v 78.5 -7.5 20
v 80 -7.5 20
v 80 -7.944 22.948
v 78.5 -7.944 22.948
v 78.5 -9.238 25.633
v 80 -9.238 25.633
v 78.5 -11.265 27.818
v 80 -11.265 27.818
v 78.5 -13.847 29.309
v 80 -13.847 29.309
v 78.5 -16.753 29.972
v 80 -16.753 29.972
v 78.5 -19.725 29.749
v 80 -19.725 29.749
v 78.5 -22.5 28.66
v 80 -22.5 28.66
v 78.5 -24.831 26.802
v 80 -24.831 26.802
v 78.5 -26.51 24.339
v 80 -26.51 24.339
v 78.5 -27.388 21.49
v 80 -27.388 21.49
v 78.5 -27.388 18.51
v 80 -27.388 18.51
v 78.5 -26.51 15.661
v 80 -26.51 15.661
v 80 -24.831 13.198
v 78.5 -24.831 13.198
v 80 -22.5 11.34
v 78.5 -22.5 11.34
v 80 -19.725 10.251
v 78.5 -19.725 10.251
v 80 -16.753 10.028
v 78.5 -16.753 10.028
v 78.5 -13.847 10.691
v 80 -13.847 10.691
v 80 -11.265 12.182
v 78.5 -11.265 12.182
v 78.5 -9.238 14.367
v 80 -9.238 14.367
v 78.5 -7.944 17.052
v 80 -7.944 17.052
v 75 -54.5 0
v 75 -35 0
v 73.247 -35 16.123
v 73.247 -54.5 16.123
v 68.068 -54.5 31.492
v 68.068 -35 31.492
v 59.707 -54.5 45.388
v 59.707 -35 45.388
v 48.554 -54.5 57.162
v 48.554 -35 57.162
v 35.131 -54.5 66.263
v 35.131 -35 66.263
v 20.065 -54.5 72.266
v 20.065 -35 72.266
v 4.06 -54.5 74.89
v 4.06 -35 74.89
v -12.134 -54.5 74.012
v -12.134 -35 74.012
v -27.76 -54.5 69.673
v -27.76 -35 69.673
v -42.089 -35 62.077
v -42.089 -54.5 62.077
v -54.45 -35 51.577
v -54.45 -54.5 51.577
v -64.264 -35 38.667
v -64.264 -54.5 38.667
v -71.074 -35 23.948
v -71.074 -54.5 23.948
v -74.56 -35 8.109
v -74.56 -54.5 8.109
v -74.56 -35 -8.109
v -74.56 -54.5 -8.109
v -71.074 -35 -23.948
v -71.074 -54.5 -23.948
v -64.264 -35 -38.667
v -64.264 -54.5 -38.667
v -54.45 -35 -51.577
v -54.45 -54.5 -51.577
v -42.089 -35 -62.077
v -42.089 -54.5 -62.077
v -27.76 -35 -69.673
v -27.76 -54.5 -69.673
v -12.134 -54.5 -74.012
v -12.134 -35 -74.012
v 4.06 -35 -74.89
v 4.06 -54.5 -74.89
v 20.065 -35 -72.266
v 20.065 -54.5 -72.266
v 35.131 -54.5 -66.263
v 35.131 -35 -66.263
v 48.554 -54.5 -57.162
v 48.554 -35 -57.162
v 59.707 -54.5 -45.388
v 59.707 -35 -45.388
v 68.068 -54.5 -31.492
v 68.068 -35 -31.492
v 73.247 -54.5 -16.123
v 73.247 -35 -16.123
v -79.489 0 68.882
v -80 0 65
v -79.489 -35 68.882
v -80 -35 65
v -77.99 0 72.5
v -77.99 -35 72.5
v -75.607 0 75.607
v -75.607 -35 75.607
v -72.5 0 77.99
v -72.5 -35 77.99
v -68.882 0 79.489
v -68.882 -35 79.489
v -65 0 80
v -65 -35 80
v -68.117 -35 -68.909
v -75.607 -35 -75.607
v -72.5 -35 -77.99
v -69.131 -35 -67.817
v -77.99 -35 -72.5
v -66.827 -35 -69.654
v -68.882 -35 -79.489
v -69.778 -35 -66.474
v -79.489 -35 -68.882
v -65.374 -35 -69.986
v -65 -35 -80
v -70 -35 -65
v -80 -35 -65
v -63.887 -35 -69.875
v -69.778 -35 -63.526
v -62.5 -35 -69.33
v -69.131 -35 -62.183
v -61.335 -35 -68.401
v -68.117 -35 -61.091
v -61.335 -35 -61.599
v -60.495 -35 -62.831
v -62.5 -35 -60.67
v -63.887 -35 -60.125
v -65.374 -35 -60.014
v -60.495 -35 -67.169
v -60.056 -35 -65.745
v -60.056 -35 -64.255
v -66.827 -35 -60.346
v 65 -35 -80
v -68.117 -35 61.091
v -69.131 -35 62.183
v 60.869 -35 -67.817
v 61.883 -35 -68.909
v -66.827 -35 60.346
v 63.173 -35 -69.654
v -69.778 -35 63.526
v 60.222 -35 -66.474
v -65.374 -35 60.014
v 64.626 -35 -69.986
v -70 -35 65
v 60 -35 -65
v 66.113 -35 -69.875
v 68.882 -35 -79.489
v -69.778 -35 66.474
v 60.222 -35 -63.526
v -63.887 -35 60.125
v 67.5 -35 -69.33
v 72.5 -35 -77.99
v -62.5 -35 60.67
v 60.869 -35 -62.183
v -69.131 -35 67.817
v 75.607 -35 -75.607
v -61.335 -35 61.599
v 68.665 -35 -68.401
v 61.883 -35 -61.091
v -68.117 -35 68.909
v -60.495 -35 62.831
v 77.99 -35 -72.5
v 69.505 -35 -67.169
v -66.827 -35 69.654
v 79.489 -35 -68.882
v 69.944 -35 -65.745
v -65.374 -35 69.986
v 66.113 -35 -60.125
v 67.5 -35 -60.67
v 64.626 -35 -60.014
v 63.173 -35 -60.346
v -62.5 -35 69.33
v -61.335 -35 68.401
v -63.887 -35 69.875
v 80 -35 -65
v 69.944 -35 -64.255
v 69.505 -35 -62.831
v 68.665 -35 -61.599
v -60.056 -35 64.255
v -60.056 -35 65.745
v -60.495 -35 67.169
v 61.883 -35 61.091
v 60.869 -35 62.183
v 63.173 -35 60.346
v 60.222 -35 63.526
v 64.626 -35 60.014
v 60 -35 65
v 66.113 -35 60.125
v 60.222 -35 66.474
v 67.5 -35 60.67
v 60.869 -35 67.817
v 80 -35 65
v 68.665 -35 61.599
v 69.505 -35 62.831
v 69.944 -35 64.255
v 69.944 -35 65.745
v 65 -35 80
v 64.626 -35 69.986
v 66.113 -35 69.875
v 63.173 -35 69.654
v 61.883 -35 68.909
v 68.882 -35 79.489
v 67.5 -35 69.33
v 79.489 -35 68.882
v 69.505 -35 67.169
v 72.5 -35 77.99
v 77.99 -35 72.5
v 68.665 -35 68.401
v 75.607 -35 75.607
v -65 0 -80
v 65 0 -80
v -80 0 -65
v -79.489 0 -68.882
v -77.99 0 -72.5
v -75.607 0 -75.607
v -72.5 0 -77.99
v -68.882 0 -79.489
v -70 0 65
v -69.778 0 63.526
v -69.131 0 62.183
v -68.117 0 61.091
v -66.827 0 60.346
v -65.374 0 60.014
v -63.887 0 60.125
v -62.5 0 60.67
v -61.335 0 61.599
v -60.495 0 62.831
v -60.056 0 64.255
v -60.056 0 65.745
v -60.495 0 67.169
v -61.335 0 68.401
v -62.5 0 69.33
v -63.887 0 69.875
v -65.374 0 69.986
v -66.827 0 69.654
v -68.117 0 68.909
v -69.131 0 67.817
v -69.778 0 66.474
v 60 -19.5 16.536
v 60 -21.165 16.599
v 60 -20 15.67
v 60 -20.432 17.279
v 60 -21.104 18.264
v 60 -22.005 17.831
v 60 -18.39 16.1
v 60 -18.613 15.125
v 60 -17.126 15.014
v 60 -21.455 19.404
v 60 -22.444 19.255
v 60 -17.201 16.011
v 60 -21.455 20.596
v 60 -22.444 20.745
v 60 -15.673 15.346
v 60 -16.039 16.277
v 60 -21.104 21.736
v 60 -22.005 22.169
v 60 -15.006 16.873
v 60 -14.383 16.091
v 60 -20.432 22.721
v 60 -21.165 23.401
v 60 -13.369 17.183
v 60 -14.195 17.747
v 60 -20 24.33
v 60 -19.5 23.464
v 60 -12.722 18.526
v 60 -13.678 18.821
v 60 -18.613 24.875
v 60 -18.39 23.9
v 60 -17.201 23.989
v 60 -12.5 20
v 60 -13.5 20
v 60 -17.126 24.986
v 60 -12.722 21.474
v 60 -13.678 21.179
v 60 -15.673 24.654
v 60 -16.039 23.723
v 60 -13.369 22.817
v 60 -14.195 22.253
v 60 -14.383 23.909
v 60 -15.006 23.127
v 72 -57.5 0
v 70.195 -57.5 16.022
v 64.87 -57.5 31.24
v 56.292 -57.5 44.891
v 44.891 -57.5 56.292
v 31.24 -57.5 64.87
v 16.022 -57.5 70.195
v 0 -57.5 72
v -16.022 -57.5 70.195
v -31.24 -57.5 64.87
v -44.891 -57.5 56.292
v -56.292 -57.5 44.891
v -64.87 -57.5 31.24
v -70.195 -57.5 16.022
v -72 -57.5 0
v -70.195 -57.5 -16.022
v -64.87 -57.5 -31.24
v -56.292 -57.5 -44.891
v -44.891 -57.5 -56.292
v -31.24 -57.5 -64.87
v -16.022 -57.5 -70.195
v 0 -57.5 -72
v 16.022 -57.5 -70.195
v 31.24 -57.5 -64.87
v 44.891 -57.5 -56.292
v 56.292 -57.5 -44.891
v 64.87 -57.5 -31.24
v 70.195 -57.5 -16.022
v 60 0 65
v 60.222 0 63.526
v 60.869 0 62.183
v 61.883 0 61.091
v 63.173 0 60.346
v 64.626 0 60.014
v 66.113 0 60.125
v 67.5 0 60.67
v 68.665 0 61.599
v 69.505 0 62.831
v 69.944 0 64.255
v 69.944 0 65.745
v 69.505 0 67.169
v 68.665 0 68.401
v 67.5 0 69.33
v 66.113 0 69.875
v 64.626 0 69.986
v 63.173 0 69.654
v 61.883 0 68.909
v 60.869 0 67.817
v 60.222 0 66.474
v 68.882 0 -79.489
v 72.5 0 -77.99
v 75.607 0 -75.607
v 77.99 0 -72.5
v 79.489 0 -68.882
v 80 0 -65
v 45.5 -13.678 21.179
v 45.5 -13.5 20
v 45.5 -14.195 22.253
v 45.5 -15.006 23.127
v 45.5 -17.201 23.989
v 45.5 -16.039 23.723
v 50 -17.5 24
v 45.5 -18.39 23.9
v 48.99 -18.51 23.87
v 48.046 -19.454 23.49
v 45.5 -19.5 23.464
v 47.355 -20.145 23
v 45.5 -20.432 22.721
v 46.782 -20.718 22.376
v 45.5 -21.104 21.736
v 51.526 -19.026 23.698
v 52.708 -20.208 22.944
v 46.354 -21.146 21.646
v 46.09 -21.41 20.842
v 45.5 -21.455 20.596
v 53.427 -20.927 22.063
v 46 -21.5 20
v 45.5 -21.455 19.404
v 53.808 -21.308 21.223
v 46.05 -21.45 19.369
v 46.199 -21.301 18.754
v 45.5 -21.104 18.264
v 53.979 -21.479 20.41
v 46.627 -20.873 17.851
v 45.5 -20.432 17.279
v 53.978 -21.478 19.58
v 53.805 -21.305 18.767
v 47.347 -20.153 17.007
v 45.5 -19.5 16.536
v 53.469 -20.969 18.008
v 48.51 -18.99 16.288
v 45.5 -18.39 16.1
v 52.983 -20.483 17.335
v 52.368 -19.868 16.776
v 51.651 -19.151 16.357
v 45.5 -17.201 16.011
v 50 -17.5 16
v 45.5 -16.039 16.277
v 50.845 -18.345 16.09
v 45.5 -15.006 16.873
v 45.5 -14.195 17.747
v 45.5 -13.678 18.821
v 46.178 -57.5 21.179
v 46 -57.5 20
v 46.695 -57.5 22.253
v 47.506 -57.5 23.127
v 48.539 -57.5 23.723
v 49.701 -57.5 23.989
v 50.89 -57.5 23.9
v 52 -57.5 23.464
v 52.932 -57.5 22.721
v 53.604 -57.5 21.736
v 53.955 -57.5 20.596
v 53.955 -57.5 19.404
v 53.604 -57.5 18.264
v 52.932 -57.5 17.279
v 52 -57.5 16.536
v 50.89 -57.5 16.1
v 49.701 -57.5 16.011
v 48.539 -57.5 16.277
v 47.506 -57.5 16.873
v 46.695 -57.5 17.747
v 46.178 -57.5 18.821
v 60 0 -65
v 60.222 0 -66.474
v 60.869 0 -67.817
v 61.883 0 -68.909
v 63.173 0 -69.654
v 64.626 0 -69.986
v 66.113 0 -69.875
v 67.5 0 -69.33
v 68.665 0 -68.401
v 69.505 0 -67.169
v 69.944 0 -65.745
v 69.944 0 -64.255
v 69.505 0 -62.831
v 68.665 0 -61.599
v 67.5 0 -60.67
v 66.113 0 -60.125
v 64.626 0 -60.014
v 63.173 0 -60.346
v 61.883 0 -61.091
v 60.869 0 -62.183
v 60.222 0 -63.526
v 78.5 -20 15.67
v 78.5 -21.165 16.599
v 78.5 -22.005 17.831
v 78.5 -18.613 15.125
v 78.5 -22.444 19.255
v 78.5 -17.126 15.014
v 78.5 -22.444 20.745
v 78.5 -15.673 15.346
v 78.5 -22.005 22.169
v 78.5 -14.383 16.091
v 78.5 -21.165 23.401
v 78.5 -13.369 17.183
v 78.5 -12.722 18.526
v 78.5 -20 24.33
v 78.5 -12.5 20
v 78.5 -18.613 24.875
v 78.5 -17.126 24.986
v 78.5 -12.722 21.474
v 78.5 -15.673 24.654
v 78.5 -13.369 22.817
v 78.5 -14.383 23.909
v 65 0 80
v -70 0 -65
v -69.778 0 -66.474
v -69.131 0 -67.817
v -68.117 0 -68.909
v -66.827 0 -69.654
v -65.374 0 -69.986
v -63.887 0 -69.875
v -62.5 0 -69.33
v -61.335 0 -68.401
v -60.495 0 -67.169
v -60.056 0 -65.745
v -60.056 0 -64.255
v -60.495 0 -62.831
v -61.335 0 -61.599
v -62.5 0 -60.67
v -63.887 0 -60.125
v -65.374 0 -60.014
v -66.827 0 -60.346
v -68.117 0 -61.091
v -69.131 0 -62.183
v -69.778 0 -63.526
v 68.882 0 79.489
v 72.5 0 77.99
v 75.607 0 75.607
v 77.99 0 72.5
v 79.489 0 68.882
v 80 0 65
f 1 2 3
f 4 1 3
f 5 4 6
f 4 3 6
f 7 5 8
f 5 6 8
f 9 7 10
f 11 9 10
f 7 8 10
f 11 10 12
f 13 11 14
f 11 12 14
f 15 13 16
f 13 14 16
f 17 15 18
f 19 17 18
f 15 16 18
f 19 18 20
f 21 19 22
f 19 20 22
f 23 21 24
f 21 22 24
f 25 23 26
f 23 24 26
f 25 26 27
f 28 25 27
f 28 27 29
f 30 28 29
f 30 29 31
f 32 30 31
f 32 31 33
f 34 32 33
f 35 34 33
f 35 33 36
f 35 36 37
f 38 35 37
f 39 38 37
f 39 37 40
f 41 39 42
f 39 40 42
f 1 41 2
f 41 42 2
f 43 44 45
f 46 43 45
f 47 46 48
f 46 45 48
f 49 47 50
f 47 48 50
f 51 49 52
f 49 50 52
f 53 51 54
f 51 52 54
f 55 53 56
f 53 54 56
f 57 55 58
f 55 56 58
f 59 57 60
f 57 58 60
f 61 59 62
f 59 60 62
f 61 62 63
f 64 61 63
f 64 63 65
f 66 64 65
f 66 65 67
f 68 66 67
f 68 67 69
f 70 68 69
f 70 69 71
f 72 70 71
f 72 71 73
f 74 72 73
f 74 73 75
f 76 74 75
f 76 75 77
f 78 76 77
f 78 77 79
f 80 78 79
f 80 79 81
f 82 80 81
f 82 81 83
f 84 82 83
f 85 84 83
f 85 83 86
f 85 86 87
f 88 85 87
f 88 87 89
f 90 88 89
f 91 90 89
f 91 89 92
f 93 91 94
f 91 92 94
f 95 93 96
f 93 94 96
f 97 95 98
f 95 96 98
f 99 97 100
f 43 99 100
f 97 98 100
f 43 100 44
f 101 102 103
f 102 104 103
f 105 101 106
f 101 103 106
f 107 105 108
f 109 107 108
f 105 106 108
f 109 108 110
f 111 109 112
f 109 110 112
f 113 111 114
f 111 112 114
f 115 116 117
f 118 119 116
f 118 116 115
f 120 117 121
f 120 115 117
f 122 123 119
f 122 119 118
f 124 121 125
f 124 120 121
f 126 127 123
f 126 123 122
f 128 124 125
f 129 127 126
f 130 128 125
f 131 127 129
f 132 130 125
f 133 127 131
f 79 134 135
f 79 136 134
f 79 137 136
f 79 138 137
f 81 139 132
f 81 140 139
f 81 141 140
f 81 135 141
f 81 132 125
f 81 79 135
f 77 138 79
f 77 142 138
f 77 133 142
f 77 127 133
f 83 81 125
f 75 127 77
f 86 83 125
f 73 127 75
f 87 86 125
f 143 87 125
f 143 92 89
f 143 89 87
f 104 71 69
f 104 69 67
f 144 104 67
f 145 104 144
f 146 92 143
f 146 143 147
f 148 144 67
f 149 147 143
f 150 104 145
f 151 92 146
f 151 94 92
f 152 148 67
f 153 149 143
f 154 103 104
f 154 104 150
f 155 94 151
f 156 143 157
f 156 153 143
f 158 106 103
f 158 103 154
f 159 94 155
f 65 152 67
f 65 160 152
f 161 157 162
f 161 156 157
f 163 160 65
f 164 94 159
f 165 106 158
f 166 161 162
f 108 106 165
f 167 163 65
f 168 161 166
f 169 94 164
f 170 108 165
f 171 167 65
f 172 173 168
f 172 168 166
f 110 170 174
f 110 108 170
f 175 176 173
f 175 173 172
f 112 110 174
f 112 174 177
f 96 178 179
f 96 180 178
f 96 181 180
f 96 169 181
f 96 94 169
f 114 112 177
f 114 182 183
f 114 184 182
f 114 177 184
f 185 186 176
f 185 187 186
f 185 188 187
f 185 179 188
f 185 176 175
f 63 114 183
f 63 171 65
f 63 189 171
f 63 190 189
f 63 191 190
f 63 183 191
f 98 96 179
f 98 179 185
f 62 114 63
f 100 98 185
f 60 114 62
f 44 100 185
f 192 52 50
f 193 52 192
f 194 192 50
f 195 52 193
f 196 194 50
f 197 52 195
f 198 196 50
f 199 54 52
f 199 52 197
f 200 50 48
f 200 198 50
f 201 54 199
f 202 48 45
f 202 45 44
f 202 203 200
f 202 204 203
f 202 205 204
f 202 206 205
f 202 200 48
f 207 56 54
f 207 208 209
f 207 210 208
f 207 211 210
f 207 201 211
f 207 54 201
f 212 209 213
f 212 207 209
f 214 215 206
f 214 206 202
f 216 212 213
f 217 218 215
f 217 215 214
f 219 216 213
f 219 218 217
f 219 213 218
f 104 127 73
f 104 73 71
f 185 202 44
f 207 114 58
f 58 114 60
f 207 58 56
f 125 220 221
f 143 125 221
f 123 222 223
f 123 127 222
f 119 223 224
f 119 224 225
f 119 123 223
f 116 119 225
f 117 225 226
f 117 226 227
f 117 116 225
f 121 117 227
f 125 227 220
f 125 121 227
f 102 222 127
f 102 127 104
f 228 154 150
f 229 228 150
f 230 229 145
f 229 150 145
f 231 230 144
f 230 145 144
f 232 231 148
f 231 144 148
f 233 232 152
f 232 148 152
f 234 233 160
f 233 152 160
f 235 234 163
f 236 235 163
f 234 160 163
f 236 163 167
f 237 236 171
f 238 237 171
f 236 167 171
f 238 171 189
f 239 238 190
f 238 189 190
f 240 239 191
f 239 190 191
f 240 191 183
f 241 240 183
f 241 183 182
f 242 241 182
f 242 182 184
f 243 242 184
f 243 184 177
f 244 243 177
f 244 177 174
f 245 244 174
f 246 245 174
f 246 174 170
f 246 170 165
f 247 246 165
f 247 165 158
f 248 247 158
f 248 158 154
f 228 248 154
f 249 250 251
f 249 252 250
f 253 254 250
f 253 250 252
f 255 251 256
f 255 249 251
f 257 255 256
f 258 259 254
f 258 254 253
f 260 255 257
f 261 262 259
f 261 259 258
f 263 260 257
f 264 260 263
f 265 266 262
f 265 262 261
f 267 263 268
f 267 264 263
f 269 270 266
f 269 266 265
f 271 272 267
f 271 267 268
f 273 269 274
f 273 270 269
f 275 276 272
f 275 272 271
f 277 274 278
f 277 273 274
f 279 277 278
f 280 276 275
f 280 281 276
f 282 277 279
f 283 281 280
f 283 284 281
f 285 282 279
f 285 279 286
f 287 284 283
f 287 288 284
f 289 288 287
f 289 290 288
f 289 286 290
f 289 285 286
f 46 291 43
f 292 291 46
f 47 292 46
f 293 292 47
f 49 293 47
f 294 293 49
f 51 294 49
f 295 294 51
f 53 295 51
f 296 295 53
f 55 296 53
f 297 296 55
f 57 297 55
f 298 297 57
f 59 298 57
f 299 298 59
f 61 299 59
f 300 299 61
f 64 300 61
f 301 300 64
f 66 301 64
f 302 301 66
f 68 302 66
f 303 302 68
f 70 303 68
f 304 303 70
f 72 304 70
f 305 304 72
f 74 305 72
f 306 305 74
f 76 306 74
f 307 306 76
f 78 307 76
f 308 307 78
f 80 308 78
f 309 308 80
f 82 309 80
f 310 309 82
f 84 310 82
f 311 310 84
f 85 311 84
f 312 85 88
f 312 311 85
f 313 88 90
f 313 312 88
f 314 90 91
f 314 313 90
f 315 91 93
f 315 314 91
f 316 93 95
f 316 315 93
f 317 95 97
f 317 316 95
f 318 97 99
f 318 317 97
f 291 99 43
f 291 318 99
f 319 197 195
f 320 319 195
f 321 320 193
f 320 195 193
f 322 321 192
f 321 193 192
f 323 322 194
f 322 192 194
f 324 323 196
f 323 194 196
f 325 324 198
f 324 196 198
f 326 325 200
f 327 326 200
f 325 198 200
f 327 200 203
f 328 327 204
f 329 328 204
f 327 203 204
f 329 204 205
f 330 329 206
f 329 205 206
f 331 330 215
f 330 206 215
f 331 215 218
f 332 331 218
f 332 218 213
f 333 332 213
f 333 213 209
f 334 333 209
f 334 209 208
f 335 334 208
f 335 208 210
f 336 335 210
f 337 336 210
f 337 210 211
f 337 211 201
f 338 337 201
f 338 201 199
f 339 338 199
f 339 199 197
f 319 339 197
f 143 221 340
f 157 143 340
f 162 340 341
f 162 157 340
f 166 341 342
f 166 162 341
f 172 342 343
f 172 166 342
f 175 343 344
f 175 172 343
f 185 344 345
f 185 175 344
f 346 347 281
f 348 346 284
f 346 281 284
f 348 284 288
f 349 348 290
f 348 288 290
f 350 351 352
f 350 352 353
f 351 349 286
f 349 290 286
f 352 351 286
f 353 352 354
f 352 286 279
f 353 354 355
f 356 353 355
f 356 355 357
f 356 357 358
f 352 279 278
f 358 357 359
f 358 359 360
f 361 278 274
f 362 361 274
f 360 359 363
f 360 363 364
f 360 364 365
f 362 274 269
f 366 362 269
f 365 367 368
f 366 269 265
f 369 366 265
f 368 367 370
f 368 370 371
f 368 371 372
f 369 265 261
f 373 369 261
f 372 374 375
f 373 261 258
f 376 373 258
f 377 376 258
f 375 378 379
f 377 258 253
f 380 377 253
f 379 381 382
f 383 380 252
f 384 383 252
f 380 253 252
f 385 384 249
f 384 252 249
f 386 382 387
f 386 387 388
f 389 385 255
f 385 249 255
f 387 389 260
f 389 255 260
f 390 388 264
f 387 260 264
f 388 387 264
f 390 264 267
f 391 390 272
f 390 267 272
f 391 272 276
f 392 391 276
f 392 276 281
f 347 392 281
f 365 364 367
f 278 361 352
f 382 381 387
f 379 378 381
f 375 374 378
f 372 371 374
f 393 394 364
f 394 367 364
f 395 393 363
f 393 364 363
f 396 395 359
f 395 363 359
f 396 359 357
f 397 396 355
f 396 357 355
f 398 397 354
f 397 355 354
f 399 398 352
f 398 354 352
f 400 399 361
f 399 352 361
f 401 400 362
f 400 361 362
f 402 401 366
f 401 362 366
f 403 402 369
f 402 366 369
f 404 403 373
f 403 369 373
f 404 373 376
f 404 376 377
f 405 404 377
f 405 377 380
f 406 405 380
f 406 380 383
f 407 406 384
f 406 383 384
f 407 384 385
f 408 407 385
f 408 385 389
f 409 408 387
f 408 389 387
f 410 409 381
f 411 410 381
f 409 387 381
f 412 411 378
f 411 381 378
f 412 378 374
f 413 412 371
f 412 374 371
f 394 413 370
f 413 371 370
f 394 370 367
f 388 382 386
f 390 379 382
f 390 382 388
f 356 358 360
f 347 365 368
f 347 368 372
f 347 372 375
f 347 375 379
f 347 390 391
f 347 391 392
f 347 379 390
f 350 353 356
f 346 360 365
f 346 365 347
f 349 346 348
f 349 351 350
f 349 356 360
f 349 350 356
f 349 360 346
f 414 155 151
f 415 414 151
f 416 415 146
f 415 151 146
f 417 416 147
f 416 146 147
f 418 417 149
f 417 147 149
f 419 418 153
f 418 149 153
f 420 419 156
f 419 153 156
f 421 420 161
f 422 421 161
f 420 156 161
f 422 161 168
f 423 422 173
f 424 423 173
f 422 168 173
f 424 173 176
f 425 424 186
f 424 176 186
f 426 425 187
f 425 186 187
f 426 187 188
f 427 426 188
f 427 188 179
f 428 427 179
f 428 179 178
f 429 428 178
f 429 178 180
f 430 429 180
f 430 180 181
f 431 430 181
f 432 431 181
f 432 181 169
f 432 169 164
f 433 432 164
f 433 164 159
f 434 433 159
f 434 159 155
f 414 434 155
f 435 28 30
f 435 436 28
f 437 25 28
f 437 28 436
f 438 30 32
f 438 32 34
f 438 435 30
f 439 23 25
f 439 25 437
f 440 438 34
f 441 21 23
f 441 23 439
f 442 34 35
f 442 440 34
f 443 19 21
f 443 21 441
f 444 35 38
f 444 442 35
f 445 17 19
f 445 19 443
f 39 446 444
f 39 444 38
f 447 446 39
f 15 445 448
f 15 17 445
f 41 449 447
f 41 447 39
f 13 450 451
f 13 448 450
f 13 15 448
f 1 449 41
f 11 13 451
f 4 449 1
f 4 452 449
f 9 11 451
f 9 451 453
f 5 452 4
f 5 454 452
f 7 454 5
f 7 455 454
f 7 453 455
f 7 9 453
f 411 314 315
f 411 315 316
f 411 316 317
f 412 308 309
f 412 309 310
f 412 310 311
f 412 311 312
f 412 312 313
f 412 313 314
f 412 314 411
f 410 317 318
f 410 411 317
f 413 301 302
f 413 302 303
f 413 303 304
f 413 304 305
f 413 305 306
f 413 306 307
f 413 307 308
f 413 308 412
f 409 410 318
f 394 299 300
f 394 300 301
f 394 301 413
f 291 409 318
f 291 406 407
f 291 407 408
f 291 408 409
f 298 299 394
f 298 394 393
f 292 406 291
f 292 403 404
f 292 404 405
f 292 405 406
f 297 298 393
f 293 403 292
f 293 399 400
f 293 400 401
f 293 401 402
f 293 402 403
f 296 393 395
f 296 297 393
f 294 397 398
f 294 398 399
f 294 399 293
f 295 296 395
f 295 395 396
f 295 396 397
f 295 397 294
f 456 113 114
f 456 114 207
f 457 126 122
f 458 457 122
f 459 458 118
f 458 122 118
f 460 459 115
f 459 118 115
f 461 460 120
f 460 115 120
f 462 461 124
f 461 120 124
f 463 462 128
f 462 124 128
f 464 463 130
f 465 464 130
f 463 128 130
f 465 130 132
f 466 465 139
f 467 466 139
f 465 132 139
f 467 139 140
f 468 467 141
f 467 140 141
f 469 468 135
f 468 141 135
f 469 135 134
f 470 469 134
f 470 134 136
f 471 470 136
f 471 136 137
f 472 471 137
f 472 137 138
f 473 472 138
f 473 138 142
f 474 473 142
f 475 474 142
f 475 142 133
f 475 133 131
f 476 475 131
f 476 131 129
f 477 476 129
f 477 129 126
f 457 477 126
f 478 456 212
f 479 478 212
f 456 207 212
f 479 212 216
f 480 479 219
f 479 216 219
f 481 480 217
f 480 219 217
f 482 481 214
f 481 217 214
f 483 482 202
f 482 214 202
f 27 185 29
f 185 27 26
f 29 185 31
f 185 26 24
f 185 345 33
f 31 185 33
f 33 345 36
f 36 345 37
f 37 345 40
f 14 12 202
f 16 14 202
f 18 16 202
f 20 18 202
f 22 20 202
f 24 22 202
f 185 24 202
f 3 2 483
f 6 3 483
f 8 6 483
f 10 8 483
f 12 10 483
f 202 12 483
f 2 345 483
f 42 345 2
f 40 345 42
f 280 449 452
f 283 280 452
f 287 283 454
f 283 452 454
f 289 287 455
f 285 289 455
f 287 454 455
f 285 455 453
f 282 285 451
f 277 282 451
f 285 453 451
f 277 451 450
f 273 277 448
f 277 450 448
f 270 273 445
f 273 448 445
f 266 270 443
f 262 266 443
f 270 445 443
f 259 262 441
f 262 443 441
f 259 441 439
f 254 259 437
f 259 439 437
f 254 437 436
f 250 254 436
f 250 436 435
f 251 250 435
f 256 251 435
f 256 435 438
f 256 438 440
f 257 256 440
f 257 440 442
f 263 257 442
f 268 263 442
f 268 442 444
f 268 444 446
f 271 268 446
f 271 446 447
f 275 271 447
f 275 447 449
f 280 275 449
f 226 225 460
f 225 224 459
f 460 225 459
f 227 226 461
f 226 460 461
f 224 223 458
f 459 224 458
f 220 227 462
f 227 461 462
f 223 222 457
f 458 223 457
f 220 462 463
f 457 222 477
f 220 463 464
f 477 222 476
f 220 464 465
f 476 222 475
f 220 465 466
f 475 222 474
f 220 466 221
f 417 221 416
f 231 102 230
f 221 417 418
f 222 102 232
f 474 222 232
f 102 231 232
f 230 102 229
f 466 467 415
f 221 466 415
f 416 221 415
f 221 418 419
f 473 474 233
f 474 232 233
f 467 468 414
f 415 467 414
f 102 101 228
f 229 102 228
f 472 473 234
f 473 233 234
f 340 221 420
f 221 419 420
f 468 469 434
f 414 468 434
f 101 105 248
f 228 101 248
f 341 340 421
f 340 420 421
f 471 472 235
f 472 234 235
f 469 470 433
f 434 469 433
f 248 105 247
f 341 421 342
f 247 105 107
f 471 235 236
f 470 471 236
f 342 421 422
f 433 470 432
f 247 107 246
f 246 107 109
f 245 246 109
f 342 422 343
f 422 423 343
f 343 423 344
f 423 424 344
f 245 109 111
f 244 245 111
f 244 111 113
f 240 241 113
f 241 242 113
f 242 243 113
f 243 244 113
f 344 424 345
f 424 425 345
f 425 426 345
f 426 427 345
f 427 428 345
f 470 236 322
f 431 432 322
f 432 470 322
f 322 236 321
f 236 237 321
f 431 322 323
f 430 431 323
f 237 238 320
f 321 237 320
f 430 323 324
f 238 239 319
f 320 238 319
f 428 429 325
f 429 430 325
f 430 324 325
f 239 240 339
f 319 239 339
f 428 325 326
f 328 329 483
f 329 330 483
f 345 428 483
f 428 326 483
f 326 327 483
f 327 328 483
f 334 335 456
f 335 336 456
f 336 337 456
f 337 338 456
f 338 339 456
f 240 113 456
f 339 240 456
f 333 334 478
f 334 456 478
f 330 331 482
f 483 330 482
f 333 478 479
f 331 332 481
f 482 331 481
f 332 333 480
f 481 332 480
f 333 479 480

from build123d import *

# Parameters (mm, degrees)
F0_W      = 160
F0_H      = 160
F0_R      = 75
F1_DEPTH  = 35
F2_DEPTH  = 57.5
F3_SIZE2  = 3
F3_SIZE   = 3
F4_R      = 15
F5_D      = 10
F7_D      = 8
F7_DEPTH  = 40
F8_R      = 4
F9_DEPTH  = 34.5
F8_R_2    = 5
F10_DEPTH = 20
F8_R_3    = 10
F11_DEPTH = 1.5


with BuildPart() as f1:
    # F0 (on Front) → F1 (new body)
    with BuildSketch(Plane.XZ):
        Rectangle(F0_W, F0_H)
        Circle(F0_R, mode=Mode.SUBTRACT)
        Circle(F0_R)
    extrude(amount=F1_DEPTH)

    # F0 (on Front) → F2 (join)
    with BuildSketch(Plane.XZ):
        Circle(F0_R)
    extrude(amount=F2_DEPTH)

    # F3
    f3_edges = [f1.edges().sort_by_distance(p)[0] for p in [
        (-75, -57.5, 0),
    ]]
    chamfer(f3_edges, length=F3_SIZE, length2=F3_SIZE2)

    # F4
    f4_edges = [f1.edges().sort_by_distance(p)[0] for p in [
        (-80, -17.5, 80),
        (-80, -17.5, -80),
        (80, -17.5, -80),
        (80, -17.5, 80),
    ]]
    fillet(f4_edges, radius=F4_R)

    # F5 (through all)
    with Locations(Plane(origin=(0, 0, 0), x_dir=(1, 0, 0), z_dir=(0, 1, 0))):
        with Locations((-65, 65), (65, 65), (65, -65), (-65, -65)):
            Hole(F5_D / 2)

    # F7
    with Locations(Plane.XZ.offset(57.5)):
        with Locations((50, 20)):
            Hole(F7_D / 2, depth=F7_DEPTH)

    # F8 (on face) → F9 (cut)
    with BuildSketch(Plane.YZ.offset(80)):
        with Locations((-17.5, 20)):
            Circle(F8_R)
    extrude(amount=-F9_DEPTH, mode=Mode.SUBTRACT)

    # F8 (on face) → F10 (cut)
    with BuildSketch(Plane.YZ.offset(80)):
        with Locations((-17.5, 20)):
            Circle(F8_R_2)
        with Locations((-17.5, 20)):
            Circle(F8_R, mode=Mode.SUBTRACT)
    extrude(amount=-F10_DEPTH, mode=Mode.SUBTRACT)

    # F8 (on face) → F11 (cut)
    with BuildSketch(Plane.YZ.offset(80)):
        with Locations((-17.5, 20)):
            Circle(F8_R_3)
        with Locations((-17.5, 20)):
            Circle(F8_R_2, mode=Mode.SUBTRACT)
    extrude(amount=-F11_DEPTH, mode=Mode.SUBTRACT)


solid = f1.part
